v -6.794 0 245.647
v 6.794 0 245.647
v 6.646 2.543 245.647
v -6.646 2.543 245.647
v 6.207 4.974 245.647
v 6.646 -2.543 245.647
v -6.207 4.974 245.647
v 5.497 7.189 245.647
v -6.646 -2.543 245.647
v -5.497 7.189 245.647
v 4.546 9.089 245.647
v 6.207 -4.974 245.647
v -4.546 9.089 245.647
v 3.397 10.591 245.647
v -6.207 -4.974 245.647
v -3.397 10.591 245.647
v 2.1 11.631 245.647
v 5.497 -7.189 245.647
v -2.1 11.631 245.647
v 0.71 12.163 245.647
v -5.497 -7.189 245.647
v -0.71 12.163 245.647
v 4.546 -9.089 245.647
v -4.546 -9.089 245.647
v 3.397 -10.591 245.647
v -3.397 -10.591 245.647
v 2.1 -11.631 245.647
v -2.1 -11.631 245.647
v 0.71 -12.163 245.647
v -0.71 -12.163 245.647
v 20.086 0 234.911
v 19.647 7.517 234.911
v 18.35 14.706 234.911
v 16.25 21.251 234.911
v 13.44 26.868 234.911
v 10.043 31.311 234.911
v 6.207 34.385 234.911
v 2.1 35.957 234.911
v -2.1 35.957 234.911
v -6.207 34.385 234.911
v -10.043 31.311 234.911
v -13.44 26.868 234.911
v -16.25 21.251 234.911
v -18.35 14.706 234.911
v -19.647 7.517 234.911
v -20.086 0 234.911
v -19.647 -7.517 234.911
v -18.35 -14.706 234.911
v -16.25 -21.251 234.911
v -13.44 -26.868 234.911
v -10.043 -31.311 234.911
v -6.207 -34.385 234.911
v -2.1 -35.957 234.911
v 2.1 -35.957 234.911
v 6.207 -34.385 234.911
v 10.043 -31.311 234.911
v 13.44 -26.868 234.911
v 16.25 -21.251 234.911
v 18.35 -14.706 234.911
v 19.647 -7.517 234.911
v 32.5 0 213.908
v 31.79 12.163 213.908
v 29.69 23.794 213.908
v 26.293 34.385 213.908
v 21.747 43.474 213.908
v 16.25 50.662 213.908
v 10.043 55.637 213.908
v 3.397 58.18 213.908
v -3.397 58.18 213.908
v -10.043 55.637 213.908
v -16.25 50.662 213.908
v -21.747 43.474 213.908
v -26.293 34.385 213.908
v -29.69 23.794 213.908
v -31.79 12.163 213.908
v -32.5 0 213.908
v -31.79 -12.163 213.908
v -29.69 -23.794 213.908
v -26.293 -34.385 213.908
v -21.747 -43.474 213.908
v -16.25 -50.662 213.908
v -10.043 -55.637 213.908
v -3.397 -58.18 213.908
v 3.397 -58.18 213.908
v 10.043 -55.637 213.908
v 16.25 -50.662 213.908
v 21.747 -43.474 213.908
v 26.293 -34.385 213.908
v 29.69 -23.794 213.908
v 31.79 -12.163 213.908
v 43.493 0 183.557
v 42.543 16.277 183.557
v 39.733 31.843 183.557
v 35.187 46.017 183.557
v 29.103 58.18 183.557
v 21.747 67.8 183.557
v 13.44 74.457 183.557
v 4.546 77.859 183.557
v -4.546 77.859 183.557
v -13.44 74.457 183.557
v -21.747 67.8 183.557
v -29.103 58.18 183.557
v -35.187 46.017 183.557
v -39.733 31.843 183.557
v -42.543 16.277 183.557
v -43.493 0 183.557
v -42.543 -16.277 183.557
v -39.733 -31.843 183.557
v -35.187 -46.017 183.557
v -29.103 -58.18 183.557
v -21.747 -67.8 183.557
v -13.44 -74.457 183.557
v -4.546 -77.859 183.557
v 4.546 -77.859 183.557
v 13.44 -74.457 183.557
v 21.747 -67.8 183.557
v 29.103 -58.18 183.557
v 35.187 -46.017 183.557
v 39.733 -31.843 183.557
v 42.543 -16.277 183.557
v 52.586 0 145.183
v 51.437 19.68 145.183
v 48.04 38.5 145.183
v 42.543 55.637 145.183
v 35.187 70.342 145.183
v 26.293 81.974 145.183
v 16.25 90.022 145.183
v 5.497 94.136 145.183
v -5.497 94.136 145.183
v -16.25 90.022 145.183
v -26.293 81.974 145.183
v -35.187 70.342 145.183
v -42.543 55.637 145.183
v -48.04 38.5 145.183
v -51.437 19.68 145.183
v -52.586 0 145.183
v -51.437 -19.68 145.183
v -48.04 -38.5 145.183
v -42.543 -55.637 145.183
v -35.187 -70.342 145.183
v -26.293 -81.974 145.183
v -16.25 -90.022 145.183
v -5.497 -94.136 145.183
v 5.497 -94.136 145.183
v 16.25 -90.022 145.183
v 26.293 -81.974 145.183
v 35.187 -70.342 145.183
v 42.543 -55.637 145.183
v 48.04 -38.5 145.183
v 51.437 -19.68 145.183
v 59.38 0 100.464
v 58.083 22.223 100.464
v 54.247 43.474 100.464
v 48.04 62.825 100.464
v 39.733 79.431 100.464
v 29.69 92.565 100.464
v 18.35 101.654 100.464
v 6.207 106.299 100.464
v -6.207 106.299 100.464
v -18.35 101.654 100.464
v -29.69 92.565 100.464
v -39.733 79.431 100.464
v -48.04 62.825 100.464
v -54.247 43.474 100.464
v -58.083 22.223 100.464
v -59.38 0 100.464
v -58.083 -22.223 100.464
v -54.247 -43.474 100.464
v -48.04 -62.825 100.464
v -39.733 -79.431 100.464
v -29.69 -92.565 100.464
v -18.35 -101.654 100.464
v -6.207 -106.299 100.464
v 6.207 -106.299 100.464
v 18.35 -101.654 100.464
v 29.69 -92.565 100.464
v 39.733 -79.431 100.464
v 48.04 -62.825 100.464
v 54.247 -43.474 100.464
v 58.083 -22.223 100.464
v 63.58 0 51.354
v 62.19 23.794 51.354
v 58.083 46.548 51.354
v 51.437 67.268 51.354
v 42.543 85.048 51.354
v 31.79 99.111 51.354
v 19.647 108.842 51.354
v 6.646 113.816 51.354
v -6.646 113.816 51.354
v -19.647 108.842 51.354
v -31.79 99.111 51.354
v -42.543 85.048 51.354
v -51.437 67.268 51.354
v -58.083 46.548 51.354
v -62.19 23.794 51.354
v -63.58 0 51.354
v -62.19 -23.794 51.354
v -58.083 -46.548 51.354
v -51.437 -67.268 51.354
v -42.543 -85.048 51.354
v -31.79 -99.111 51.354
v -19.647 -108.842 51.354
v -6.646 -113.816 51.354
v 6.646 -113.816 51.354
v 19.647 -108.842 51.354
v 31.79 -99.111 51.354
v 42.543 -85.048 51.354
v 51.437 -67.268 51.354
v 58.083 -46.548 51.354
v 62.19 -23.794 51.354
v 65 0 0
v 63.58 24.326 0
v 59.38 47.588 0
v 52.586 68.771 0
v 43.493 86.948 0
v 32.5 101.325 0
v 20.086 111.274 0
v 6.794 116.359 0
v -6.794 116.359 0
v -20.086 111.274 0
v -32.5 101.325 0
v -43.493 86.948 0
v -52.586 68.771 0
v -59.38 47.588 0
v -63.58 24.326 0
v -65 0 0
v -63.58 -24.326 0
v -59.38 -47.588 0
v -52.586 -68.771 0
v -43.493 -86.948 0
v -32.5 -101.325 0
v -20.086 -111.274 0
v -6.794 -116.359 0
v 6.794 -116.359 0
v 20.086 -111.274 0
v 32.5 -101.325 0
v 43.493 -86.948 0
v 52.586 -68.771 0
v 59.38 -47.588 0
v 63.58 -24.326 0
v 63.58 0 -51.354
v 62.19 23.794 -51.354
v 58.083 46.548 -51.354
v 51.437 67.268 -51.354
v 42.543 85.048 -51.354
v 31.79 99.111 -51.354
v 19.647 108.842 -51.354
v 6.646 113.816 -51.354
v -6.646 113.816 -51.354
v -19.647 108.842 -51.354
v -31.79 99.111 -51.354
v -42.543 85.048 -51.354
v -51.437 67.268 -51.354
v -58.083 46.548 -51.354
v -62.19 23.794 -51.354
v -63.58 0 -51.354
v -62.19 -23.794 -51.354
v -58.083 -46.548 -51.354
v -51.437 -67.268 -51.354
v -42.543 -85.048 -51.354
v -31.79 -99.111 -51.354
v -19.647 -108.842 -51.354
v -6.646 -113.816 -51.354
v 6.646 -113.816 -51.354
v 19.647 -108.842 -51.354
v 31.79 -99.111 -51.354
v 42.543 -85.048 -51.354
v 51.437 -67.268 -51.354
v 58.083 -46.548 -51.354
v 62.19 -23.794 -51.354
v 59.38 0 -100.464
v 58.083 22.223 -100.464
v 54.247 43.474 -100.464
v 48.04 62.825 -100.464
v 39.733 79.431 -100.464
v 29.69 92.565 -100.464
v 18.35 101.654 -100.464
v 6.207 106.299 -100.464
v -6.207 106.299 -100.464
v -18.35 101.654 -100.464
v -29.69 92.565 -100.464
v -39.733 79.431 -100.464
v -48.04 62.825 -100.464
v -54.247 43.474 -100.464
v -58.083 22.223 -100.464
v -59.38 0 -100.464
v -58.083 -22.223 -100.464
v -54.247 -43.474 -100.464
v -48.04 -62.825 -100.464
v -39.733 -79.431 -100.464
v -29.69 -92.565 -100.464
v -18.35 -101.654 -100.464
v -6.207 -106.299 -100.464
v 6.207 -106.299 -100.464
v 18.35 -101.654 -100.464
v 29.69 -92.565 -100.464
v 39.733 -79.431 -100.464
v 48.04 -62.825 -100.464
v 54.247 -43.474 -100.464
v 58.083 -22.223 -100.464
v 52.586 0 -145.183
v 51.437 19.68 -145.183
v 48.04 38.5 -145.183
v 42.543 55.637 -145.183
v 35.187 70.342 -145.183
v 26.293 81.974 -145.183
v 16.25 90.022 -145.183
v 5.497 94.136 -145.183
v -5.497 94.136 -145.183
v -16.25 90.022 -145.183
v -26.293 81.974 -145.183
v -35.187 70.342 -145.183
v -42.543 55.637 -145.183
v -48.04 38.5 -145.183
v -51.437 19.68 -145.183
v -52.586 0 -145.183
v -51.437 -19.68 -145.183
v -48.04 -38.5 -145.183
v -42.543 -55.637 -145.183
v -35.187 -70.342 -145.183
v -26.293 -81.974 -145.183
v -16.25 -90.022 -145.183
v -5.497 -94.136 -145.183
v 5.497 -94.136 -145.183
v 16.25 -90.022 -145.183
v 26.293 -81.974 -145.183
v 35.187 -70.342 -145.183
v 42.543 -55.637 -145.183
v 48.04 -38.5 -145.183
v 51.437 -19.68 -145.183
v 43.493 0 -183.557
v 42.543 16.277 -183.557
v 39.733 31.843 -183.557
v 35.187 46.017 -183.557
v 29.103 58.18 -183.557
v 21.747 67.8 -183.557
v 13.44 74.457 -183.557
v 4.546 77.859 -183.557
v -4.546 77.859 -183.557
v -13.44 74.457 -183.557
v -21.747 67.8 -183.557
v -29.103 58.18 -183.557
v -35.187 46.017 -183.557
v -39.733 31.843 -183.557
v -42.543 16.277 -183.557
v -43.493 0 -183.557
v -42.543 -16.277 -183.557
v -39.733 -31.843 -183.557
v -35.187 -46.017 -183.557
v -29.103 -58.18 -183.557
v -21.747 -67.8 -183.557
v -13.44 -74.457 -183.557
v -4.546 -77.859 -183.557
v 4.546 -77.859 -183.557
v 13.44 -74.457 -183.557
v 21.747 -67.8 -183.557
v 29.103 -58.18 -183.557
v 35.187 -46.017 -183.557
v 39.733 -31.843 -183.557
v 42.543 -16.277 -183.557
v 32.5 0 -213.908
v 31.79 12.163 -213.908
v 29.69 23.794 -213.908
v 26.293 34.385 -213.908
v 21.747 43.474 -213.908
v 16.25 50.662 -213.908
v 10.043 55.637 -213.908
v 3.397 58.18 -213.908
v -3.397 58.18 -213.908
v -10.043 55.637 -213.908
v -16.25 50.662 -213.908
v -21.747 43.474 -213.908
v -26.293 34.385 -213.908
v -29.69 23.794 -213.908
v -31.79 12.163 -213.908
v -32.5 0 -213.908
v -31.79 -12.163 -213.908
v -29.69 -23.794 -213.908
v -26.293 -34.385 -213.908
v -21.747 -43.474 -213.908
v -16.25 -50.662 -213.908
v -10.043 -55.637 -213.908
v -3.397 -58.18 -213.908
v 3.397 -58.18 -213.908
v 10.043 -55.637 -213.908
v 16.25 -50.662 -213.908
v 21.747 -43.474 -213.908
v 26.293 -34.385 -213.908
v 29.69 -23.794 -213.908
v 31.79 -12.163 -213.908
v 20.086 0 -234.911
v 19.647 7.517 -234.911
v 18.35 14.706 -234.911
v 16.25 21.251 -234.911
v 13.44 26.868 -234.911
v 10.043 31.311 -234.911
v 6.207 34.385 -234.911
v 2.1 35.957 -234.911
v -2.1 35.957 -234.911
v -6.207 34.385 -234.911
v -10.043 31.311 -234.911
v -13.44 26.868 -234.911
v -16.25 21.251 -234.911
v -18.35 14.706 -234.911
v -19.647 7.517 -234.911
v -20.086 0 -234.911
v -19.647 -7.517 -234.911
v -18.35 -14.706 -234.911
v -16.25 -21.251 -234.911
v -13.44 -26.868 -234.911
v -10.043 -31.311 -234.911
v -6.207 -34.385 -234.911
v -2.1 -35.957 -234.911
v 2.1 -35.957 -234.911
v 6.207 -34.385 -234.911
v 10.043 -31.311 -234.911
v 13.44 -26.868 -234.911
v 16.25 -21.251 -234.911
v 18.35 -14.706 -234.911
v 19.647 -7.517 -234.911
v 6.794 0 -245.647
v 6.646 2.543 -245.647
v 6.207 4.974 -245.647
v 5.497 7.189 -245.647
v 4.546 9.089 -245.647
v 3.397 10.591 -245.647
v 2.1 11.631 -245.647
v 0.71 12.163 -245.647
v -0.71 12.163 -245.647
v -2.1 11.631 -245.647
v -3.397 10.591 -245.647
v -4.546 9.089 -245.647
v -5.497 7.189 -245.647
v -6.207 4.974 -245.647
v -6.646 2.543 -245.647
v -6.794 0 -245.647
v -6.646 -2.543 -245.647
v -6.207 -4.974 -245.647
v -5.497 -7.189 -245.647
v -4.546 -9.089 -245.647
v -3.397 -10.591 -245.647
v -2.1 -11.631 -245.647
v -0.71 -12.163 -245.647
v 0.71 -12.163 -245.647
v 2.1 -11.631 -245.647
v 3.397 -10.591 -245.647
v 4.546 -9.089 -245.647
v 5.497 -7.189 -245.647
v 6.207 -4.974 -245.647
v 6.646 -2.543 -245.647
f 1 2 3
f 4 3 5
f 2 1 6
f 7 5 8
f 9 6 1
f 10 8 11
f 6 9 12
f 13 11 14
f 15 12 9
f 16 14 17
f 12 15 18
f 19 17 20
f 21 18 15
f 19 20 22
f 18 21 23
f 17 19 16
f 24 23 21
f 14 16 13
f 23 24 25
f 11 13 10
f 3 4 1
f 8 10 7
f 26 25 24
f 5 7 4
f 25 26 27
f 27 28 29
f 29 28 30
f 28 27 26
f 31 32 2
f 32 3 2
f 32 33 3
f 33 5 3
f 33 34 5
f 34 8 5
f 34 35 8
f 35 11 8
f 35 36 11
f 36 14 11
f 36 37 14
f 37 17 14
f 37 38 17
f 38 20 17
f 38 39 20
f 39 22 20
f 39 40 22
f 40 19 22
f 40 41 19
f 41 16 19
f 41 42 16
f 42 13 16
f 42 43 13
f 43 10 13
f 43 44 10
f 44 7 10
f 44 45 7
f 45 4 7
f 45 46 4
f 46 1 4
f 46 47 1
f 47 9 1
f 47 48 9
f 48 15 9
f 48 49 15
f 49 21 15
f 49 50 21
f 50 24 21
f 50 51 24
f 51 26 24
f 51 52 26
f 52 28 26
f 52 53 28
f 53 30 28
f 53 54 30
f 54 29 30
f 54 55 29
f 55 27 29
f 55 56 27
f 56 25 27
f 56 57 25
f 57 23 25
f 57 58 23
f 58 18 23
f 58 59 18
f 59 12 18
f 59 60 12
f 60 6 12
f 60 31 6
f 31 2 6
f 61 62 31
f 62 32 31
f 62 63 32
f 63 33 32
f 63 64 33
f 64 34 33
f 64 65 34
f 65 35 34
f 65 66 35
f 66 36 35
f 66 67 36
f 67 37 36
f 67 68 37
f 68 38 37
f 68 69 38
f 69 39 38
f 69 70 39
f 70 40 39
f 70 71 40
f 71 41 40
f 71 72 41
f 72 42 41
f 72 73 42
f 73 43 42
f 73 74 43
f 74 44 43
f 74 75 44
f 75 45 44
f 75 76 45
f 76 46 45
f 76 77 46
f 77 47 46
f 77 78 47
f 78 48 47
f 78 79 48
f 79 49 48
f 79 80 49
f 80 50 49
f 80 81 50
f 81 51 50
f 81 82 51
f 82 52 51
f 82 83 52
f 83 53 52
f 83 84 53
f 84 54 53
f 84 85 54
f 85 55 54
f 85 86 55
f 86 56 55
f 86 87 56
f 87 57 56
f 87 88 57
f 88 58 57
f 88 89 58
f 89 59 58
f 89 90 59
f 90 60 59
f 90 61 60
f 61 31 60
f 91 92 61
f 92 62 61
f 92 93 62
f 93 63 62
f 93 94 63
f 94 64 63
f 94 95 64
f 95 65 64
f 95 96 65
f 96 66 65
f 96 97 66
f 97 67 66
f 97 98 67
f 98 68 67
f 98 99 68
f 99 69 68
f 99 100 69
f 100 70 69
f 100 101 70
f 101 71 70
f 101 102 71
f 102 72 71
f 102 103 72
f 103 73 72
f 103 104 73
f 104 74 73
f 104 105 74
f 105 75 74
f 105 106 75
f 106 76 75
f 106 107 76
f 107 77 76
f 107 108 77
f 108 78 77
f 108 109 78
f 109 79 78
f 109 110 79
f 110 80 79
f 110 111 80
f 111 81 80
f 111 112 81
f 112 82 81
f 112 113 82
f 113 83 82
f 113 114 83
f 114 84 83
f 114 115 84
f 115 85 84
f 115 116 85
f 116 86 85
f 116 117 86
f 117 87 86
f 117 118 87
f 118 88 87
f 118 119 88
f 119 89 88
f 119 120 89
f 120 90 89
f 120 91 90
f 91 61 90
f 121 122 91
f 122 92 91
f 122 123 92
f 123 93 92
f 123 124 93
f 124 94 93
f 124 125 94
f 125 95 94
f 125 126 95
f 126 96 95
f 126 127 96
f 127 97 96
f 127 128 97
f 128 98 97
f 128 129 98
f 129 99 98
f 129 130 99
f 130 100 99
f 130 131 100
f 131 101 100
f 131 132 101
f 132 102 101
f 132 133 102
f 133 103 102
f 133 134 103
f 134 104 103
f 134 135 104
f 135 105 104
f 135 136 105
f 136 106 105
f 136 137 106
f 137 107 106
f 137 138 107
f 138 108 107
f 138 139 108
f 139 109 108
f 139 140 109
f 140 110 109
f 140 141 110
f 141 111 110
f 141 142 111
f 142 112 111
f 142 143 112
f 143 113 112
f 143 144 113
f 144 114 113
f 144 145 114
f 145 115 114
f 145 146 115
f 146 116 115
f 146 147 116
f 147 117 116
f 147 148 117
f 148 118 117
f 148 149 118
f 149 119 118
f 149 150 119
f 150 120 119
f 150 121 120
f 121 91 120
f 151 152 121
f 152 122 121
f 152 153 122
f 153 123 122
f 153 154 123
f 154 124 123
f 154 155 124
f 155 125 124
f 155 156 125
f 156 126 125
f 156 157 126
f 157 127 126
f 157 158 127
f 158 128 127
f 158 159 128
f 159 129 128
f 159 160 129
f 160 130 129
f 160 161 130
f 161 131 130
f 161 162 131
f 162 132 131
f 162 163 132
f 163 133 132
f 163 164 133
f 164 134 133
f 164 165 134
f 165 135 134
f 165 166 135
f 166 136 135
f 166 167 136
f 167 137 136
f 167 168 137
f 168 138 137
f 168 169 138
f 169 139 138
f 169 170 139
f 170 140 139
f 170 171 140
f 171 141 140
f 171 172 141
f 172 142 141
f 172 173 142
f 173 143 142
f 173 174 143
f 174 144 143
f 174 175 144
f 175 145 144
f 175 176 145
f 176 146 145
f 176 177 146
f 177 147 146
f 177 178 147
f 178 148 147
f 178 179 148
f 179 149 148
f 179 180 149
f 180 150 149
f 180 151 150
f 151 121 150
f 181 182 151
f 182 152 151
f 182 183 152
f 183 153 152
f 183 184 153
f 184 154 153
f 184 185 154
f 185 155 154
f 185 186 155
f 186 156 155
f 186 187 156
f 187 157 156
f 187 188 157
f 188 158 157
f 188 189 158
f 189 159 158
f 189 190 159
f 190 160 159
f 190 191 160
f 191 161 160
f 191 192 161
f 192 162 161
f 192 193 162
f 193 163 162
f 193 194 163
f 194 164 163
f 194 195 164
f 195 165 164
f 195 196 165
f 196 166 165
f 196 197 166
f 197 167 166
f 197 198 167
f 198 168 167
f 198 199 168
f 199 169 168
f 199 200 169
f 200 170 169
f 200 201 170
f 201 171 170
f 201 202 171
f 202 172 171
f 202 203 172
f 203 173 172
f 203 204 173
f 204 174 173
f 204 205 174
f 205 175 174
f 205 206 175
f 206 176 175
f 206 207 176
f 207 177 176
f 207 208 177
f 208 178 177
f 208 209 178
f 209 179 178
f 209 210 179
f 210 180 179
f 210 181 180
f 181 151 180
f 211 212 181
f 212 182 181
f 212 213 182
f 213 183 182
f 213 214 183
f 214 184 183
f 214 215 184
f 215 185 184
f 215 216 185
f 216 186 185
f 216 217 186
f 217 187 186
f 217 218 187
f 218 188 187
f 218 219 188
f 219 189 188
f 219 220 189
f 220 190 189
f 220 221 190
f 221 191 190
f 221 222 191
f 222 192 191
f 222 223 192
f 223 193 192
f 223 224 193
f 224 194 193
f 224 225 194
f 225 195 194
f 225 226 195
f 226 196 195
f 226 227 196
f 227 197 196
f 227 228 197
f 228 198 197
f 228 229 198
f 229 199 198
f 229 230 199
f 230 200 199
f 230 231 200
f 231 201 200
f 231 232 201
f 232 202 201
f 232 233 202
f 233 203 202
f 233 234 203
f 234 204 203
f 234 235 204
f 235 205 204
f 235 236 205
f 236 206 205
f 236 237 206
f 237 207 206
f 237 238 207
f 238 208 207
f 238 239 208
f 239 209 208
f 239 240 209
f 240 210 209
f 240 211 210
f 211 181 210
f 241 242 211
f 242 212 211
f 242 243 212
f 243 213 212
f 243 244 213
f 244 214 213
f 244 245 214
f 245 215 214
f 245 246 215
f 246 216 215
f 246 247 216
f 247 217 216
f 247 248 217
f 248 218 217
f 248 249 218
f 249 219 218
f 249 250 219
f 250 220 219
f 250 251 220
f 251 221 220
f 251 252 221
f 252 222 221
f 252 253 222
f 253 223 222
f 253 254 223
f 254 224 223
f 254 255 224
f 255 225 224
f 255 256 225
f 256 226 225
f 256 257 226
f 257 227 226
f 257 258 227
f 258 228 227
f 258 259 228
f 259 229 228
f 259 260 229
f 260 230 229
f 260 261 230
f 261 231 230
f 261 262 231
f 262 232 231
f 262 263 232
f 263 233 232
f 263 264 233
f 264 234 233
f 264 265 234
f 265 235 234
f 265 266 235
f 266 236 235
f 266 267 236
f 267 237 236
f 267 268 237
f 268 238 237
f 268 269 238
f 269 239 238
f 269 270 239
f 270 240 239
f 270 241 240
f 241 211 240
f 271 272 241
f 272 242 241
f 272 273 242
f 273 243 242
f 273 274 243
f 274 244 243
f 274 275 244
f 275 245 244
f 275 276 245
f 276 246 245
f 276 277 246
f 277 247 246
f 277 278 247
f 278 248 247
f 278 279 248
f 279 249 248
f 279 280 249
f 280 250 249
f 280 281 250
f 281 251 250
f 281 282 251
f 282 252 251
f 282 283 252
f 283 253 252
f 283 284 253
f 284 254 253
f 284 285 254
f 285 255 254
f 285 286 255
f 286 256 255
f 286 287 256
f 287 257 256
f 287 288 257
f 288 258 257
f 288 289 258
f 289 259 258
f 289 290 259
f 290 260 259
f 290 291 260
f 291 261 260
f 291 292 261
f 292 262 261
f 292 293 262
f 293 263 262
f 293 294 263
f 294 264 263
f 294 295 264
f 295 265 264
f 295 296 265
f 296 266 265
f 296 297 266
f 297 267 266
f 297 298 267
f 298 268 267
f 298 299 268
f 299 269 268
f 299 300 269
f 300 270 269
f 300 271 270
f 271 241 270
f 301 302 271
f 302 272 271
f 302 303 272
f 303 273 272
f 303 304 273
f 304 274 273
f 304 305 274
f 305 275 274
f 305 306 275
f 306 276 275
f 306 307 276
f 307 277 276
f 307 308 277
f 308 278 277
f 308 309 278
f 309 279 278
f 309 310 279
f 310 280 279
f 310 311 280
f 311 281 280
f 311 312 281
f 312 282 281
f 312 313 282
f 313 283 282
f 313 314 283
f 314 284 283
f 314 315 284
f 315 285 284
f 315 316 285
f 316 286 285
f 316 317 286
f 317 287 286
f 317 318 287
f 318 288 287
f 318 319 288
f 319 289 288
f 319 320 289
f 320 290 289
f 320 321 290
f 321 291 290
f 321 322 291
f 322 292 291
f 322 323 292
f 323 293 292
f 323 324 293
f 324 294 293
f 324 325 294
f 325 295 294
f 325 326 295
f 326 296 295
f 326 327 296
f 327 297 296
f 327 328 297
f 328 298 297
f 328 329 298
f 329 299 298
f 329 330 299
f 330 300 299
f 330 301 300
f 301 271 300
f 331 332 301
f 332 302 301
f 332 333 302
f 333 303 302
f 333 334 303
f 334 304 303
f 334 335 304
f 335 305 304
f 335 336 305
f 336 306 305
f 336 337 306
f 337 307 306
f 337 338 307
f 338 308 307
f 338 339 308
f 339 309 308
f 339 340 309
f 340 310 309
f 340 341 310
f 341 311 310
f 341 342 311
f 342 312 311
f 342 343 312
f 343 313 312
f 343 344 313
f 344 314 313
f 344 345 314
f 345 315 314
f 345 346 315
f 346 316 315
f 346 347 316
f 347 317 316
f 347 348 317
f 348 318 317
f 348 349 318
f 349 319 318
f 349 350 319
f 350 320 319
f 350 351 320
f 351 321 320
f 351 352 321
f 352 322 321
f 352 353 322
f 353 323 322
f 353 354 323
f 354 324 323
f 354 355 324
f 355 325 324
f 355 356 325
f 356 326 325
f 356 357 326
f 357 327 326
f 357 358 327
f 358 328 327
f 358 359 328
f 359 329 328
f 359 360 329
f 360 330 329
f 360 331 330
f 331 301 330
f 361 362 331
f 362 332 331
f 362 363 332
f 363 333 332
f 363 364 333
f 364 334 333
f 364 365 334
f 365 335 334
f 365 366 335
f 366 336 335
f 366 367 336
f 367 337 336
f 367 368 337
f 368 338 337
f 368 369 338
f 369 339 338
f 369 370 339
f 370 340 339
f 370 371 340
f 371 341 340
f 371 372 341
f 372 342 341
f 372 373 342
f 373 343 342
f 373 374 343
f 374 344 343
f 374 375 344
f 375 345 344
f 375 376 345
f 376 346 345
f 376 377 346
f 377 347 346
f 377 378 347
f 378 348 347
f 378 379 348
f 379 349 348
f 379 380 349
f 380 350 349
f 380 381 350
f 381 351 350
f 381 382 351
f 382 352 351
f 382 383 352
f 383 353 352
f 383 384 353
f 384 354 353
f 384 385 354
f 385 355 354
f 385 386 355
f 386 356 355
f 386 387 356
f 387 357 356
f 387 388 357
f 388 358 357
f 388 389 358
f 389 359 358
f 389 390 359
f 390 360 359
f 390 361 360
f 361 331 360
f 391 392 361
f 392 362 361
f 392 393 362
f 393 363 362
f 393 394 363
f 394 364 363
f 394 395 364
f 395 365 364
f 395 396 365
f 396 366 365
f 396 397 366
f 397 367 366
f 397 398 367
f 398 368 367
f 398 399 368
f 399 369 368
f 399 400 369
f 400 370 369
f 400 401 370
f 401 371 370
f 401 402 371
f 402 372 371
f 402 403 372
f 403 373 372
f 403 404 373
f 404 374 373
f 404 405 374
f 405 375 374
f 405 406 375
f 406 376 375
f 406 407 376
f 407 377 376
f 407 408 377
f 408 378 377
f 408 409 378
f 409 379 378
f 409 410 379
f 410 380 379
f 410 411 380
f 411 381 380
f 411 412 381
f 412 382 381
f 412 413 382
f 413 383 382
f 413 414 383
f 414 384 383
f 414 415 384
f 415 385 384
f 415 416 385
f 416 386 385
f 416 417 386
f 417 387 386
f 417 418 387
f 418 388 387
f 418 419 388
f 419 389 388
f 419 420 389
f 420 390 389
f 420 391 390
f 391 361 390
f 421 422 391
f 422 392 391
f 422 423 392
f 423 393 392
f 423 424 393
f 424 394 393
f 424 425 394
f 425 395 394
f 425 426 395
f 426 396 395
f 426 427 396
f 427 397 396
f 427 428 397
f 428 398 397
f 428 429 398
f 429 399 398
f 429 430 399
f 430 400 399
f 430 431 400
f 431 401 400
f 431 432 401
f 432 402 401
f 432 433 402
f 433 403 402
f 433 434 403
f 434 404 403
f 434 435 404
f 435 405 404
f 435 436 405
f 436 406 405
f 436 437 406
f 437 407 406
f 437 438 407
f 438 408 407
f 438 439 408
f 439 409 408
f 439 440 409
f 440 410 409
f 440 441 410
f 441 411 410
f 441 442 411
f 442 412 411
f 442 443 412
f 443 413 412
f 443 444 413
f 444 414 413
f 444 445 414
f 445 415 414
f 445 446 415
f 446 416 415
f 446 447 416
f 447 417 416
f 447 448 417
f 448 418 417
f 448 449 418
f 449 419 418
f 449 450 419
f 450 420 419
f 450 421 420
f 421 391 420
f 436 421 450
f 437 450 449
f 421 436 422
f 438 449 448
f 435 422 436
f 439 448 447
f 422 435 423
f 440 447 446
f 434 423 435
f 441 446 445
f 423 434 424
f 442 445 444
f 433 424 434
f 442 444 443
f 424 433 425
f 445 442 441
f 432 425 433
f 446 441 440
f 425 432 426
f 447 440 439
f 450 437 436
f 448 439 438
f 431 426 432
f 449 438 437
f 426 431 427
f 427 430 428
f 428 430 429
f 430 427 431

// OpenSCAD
// Generated by SolidPython 1.0.1 on 2020-07-29 00:46:46


scale(v = [5, 9, 19]) {
	sphere(r = 13);
}
/***********************************************
*********      SolidPython code:      **********
************************************************
 
# import packages: SolidPython
from solid import *
from solid.utils import *
from itertools import chain, combinations, permutations


class Resize:

    def __init__(self, scad_file):
        self.scad_file = scad_file
        #self.scad_file = import_scad(scad_file)
        # cone/cylinder param:
        self.r1 = 0
        self.r2 = 0
        self.h = 0
        # rectangular prism param:
        self.w = 0
        self.l = 0
        # ellipse param:
        self.r = 0

    # import OpenScad code (file name corresponds to shape)


    # classify shape + parameters
    def assign(self, param1, param2, param3):
        if self.scad_file == 'cone.scad':
            self.r1 = param1
            self.r2 = param2
            self.h = param3
        elif self.scad_file == 'cylinder.scad':
            self.r1 = param1
            self.r2 = param2
            self.h = param3
        elif self.scad_file == 'rectangularPrism.scad':
            self.h = param1
            self.l = param2
            self.w = param3
        else:
            self.r = param1
            self.h = param2

    # resize parameters
    def iterate(self):
        x = range(3, 20, 2)
        i = 1
        if self.scad_file == 'cone.scad':
            tempList = list(permutations(x, 2))
            for temp in tempList:
                param1 = temp[0]
                param2 = temp[1]
                filepath = 'produced_scad_files/' + 'cone' + str(param1) + '_' + str(param2) + '_' + '.scad'
                scad_render_to_file(cylinder(h=param1, r1=param2, r2=0), filepath)

        elif self.scad_file == 'cylinder.scad':
            tempList = list(permutations(x, 3))
            for temp in tempList:
                param1 = temp[0]
                param2 = temp[1]
                filepath = 'produced_scad_files/' + 'cylinder' + str(param1) + '_' + str(param2) + '_' + '.scad'
                scad_render_to_file(cylinder(h=param1, r1=param2, r2=param2), filepath)

        elif self.scad_file == 'rectangularPrism.scad':
            tempList = list(permutations(x, 3))
            for temp in tempList:
                param1 = temp[0]
                param2 = temp[1]
                param3 = temp[2]
                filepath = 'produced_scad_files/' + 'rectangularPrism' + str(param1) + '_' + str(param2) + '_' + str(
                    param3) + '.scad'
                scad_render_to_file(cube(size=(param1, param2, param3)), filepath)

        elif self.scad_file == 'ellipse.scad':
            tempList = list(permutations(x, 4))
            for temp in tempList:
                param1 = temp[0]
                param2 = temp[1]
                param3 = temp[2]
                param4 = temp[3]
                filepath = 'produced_scad_files/' + 'ellipse' + str(param1) + '_' + str(param2) + '_' + str(param3) + '_' + str(param4) + '.scad'
                scad_render_to_file(scale([param1, param2, param3])(sphere(r=param4)), filepath)

    def render_to_scadfile(self):
        scad_render_to_file(scad, 'example.scad') 
 
************************************************/
